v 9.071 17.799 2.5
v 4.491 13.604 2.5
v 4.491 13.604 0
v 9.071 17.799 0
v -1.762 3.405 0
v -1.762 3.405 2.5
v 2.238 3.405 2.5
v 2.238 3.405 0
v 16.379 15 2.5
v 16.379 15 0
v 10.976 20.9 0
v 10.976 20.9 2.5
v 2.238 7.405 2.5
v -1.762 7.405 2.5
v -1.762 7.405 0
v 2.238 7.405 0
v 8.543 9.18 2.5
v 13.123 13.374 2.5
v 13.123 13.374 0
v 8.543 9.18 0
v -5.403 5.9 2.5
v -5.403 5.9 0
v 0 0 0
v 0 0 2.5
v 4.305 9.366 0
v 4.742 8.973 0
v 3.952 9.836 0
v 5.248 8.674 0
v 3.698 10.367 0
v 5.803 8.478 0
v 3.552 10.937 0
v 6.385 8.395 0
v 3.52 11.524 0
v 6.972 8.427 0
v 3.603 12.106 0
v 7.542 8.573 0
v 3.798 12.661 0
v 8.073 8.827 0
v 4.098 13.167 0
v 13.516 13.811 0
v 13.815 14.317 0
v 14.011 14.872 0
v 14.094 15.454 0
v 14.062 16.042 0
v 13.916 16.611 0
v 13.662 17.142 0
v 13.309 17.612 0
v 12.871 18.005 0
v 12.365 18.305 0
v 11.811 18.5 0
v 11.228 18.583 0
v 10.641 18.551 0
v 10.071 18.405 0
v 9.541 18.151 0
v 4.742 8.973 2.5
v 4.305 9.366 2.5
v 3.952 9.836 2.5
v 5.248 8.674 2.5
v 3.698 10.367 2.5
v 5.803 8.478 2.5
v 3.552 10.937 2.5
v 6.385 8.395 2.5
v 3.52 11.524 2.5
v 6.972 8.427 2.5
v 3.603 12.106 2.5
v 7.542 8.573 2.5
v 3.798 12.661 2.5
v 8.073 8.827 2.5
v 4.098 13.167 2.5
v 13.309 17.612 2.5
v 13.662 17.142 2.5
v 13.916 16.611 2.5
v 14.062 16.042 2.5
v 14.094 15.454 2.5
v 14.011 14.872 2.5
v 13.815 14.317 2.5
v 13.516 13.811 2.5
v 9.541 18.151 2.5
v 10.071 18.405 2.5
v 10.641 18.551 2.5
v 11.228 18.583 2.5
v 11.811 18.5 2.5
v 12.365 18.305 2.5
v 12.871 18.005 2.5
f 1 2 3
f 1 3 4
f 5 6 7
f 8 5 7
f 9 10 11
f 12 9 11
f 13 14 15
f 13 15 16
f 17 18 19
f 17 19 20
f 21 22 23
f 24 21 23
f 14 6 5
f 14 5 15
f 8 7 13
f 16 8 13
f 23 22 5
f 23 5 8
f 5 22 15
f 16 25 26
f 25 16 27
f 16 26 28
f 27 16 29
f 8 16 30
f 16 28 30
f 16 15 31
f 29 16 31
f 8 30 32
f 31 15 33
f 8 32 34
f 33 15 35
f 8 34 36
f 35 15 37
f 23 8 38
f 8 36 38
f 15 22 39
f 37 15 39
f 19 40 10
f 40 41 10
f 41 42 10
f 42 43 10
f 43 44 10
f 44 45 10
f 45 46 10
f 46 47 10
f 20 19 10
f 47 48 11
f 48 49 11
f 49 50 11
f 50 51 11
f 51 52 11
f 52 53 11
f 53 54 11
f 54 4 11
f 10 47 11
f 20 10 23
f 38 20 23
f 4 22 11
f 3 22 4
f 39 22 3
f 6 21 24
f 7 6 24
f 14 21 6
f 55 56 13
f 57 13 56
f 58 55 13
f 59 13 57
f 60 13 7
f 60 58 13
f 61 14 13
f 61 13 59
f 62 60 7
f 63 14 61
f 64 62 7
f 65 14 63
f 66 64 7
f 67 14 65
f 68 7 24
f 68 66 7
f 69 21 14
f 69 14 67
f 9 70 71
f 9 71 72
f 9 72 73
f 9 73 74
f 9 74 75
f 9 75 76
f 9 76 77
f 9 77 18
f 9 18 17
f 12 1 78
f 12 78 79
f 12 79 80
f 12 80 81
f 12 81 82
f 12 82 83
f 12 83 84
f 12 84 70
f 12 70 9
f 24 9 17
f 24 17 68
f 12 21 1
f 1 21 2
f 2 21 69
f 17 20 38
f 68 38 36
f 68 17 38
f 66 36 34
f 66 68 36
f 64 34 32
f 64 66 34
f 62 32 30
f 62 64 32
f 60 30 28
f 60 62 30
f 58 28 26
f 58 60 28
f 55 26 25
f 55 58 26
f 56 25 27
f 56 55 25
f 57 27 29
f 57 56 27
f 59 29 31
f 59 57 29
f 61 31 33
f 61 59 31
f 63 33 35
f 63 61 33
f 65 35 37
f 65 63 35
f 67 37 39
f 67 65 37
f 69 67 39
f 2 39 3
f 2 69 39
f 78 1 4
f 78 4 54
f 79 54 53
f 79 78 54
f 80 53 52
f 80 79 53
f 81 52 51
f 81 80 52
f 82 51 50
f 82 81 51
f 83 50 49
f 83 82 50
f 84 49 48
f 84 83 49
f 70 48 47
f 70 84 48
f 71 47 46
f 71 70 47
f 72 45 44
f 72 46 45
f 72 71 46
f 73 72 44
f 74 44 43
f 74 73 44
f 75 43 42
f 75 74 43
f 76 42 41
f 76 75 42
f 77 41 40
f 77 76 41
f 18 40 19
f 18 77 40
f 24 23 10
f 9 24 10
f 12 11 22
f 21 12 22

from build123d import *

# Parameters (mm, degrees)
BOSS_EXTRUDE1_DEPTH = 2.5
SKETCH2_W           = 4
SKETCH2_H           = 4
CUT_EXTRUDE1_DEPTH  = 27.670895226
CUT_EXTRUDE2_DEPTH  = 27.670895226


with BuildPart() as part:
    # Sketch1 → Boss-Extrude1 (new body)
    with BuildSketch(Plane.XY):
        Polygon((0, 0), (16.37938033, 15), (10.976408696, 20.899821821), (-5.402971634, 5.899821821), align=None)
    extrude(amount=BOSS_EXTRUDE1_DEPTH)

    # Sketch2 → Cut-Extrude1 (cut, through all)
    with BuildSketch(Plane.XY.offset(2.5)):
        with Locations((0.237599868, 5.405134804)):
            Rectangle(SKETCH2_W, SKETCH2_H)
    extrude(amount=-CUT_EXTRUDE1_DEPTH, mode=Mode.SUBTRACT)

    # Sketch3 → Cut-Extrude2 (cut, through all)
    with BuildSketch(Plane.XY.offset(2.5)):
        with BuildLine():
            Line((13.122836829, 13.373677638), (8.543100141, 9.179620906))
            ThreePointArc((8.543100141, 9.179620906), (4.304552595, 9.365939726), (4.490871415, 13.604487272))
            Line((4.490871415, 13.604487272), (9.070608103, 17.798544003))
            ThreePointArc((9.070608103, 17.798544003), (13.309155649, 17.612225183), (13.122836829, 13.373677638))
        make_face()
    extrude(amount=-CUT_EXTRUDE2_DEPTH, mode=Mode.SUBTRACT)


solid = part.part
